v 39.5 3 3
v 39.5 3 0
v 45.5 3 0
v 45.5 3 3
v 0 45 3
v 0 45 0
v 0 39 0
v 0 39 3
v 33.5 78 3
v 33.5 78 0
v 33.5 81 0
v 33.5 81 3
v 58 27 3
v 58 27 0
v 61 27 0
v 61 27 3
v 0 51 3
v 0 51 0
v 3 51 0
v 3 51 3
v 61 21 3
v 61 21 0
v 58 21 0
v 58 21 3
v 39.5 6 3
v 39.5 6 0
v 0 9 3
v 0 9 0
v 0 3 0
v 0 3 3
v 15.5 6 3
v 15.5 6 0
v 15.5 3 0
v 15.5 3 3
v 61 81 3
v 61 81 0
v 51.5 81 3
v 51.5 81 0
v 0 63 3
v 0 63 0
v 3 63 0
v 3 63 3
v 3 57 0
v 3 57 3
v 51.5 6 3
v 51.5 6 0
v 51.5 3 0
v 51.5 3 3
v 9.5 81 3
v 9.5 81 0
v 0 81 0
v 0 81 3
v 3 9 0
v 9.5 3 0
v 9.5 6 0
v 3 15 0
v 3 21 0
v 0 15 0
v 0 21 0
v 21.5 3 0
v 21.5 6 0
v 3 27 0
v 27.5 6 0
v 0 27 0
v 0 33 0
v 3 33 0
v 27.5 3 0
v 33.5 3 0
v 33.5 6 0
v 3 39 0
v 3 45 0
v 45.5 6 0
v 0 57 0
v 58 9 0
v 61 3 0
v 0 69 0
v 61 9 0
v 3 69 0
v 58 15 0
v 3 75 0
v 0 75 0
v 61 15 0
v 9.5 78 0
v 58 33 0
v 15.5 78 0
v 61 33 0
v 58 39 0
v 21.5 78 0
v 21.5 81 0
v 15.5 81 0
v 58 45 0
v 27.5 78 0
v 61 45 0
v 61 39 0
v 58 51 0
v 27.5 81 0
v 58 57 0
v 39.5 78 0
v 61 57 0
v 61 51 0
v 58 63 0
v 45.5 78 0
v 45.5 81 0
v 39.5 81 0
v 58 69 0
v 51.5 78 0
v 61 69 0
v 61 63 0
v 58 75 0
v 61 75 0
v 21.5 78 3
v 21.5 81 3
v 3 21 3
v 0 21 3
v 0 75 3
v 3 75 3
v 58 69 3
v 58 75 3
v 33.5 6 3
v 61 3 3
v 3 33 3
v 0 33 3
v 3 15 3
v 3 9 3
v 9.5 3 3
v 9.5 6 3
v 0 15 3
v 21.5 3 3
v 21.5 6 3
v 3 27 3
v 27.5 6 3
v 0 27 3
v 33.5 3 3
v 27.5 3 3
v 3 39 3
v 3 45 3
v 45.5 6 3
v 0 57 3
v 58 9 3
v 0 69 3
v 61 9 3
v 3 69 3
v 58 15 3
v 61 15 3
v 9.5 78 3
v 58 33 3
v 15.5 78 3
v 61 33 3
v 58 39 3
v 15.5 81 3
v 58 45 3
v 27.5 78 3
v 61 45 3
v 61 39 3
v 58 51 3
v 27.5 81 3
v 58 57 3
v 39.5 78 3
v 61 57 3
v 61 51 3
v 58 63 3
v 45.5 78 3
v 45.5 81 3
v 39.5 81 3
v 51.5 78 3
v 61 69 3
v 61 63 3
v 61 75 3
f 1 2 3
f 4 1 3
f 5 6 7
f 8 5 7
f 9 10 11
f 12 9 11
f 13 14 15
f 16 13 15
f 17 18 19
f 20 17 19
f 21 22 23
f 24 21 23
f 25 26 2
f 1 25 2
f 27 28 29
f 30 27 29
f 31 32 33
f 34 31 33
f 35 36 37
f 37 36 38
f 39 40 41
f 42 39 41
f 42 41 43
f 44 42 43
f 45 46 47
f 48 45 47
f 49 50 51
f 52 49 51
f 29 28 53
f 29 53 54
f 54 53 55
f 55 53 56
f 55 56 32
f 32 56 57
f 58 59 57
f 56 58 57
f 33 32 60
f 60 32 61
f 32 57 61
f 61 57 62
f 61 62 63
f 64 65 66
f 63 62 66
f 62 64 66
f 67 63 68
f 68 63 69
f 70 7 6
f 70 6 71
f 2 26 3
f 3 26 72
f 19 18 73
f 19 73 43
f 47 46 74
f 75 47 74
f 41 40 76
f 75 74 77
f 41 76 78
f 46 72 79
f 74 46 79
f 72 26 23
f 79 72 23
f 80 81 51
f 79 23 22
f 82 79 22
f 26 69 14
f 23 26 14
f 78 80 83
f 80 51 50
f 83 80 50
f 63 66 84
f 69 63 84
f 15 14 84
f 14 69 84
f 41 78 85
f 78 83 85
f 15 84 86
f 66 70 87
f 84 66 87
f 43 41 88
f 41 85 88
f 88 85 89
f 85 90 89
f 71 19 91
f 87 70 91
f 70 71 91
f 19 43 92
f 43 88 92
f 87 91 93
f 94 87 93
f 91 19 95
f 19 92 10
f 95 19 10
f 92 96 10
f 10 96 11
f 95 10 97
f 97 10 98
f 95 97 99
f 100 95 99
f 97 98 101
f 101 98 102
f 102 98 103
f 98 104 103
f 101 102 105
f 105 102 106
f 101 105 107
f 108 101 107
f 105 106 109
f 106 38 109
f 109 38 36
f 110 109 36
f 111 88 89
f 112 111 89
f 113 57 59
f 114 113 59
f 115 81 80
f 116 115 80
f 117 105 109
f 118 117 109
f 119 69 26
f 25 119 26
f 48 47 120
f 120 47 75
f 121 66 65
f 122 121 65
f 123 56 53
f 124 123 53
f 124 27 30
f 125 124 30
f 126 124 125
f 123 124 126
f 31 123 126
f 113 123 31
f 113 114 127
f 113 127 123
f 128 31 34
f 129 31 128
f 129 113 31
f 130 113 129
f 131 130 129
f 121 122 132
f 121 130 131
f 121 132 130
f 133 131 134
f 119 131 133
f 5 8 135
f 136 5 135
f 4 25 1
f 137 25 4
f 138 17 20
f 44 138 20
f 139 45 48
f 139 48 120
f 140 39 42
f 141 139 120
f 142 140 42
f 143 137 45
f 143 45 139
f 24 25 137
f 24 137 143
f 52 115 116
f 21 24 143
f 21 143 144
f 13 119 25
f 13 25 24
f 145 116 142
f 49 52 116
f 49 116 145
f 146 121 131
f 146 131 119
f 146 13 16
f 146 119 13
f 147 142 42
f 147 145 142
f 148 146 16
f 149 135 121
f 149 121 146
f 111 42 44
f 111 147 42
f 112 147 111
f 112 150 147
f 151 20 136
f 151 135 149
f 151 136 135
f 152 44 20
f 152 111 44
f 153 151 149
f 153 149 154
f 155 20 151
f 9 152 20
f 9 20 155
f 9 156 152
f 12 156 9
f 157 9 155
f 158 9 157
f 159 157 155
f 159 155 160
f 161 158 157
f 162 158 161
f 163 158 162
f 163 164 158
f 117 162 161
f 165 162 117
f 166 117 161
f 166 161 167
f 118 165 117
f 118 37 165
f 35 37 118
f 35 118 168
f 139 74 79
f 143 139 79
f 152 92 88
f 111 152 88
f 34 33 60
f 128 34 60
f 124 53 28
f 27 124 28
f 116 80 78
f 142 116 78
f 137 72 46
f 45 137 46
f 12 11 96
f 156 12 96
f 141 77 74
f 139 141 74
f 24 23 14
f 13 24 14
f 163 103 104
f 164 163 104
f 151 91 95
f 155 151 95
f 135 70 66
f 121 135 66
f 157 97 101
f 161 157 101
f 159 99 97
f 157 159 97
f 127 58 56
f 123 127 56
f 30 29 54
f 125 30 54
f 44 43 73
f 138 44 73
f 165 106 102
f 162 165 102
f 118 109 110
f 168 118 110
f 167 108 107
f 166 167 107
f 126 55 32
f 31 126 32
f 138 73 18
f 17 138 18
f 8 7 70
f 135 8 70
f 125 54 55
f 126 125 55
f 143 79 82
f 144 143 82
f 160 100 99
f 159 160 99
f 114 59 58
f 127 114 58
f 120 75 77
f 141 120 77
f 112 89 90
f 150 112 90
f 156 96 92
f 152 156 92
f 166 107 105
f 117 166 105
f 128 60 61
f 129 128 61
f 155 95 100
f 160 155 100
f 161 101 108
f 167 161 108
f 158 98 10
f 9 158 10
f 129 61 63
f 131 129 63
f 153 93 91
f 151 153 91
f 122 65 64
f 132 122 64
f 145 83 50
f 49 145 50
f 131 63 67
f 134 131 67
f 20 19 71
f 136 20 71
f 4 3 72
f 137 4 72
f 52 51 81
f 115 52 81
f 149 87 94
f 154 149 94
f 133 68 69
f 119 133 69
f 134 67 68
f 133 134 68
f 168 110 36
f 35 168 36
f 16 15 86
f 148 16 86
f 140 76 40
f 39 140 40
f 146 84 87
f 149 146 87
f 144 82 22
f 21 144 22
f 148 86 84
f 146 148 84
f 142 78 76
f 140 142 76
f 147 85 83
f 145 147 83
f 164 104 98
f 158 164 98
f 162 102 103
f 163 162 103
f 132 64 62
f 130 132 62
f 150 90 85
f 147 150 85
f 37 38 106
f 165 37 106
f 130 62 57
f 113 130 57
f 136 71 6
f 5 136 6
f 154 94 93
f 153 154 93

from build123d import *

# Parameters (mm, degrees)
EXTRUDE_1_DEPTH = 3


with BuildPart() as part:
    # 草图2 → 凸台-拉伸1 (new body)
    with BuildSketch(Plane.XY):
        Polygon((0, 81), (0, 75), (3, 75), (3, 69), (0, 69), (0, 63), (3, 63), (3, 57), (0, 57), (0, 51), (3, 51), (3, 45), (0, 45), (0, 39), (3, 39), (3, 33), (0, 33), (0, 27), (3, 27), (3, 21), (0, 21), (0, 15), (3, 15), (3, 9), (0, 9), (0, 3), (9.5, 3), (9.5, 6), (15.5, 6), (15.5, 3), (21.5, 3), (21.5, 6), (27.5, 6), (27.5, 3), (33.5, 3), (33.5, 6), (39.5, 6), (39.5, 3), (45.5, 3), (45.5, 6), (51.5, 6), (51.5, 3), (57.5, 3), (61, 3), (61, 9), (58, 9), (58, 15), (61, 15), (61, 21), (58, 21), (58, 27), (61, 27), (61, 33), (58, 33), (58, 39), (61, 39), (61, 45), (58, 45), (58, 51), (61, 51), (61, 57), (58, 57), (58, 63), (61, 63), (61, 69), (58, 69), (58, 75), (61, 75), (61, 81), (51.5, 81), (51.5, 78), (45.5, 78), (45.5, 81), (39.5, 81), (39.5, 78), (33.5, 78), (33.5, 81), (27.5, 81), (27.5, 78), (21.5, 78), (21.5, 81), (15.5, 81), (15.5, 78), (9.5, 78), (9.5, 81), (3.5, 81), align=None)
    extrude(amount=EXTRUDE_1_DEPTH)


solid = part.part
